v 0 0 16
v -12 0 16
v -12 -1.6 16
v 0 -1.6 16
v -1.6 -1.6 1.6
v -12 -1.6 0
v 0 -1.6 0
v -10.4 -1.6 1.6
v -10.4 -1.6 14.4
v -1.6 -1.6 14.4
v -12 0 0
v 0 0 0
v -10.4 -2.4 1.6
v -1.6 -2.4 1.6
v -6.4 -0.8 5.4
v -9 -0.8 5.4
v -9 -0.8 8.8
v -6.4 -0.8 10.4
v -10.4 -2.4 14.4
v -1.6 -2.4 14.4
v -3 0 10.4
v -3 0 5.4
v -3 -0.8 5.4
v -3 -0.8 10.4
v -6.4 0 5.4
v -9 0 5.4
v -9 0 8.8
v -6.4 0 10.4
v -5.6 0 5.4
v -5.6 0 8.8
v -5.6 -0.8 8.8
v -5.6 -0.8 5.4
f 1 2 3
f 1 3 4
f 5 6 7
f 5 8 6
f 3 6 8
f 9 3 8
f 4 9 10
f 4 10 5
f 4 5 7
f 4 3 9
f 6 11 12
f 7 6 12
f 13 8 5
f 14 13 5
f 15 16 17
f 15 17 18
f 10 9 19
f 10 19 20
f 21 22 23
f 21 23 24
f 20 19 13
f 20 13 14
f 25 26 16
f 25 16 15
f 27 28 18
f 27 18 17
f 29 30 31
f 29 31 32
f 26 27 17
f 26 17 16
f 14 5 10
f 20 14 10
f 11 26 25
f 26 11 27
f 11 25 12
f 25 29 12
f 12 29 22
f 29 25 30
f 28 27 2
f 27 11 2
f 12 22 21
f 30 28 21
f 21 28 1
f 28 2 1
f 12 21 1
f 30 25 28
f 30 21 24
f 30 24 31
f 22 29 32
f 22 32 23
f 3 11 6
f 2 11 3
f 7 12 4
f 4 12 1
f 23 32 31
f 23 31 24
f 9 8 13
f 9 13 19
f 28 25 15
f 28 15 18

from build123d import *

# Parameters (mm, degrees)
F0_W     = 12
F0_H     = 16
F0_W_2   = 8.8
F0_H_2   = 12.8
F1_DEPTH = 1.6
F2_DEPTH = 2.4
F3_DEPTH = 0.8


with BuildPart() as f1:
    # F0 (on Front) → F1 (new body)
    with BuildSketch(Plane.XZ):
        with Locations((-6, 8)):
            Rectangle(F0_W, F0_H)
        with Locations((-6, 8)):
            Rectangle(F0_W_2, F0_H_2, mode=Mode.SUBTRACT)
    extrude(amount=F1_DEPTH)

    # F0 (on Front) → F2 (join)
    with BuildSketch(Plane.XZ):
        with Locations((-6, 8)):
            Rectangle(F0_W_2, F0_H_2)
        Polygon((-9, 10.4), (-6.4, 10.4), (-6.4, 5.4), (-9, 5.4), (-9, 8.8), align=None, mode=Mode.SUBTRACT)
        Polygon((-5.6, 10.4), (-3, 10.4), (-3, 5.4), (-5.6, 5.4), (-5.6, 8.8), align=None, mode=Mode.SUBTRACT)
        Polygon((-3, 5.4), (-3, 10.4), (-5.6, 8.8), (-5.6, 5.4), align=None)
        Polygon((-5.6, 8.8), (-3, 10.4), (-5.6, 10.4), align=None)
        Polygon((-6.4, 5.4), (-6.4, 10.4), (-9, 8.8), (-9, 5.4), align=None)
        Polygon((-9, 8.8), (-6.4, 10.4), (-9, 10.4), align=None)
    extrude(amount=F2_DEPTH)

    # F0 (on Front) → F3 (cut)
    with BuildSketch(Plane.XZ):
        Polygon((-3, 5.4), (-3, 10.4), (-5.6, 8.8), (-5.6, 5.4), align=None)
        Polygon((-6.4, 5.4), (-6.4, 10.4), (-9, 8.8), (-9, 5.4), align=None)
    extrude(amount=F3_DEPTH, mode=Mode.SUBTRACT)


solid = f1.part
